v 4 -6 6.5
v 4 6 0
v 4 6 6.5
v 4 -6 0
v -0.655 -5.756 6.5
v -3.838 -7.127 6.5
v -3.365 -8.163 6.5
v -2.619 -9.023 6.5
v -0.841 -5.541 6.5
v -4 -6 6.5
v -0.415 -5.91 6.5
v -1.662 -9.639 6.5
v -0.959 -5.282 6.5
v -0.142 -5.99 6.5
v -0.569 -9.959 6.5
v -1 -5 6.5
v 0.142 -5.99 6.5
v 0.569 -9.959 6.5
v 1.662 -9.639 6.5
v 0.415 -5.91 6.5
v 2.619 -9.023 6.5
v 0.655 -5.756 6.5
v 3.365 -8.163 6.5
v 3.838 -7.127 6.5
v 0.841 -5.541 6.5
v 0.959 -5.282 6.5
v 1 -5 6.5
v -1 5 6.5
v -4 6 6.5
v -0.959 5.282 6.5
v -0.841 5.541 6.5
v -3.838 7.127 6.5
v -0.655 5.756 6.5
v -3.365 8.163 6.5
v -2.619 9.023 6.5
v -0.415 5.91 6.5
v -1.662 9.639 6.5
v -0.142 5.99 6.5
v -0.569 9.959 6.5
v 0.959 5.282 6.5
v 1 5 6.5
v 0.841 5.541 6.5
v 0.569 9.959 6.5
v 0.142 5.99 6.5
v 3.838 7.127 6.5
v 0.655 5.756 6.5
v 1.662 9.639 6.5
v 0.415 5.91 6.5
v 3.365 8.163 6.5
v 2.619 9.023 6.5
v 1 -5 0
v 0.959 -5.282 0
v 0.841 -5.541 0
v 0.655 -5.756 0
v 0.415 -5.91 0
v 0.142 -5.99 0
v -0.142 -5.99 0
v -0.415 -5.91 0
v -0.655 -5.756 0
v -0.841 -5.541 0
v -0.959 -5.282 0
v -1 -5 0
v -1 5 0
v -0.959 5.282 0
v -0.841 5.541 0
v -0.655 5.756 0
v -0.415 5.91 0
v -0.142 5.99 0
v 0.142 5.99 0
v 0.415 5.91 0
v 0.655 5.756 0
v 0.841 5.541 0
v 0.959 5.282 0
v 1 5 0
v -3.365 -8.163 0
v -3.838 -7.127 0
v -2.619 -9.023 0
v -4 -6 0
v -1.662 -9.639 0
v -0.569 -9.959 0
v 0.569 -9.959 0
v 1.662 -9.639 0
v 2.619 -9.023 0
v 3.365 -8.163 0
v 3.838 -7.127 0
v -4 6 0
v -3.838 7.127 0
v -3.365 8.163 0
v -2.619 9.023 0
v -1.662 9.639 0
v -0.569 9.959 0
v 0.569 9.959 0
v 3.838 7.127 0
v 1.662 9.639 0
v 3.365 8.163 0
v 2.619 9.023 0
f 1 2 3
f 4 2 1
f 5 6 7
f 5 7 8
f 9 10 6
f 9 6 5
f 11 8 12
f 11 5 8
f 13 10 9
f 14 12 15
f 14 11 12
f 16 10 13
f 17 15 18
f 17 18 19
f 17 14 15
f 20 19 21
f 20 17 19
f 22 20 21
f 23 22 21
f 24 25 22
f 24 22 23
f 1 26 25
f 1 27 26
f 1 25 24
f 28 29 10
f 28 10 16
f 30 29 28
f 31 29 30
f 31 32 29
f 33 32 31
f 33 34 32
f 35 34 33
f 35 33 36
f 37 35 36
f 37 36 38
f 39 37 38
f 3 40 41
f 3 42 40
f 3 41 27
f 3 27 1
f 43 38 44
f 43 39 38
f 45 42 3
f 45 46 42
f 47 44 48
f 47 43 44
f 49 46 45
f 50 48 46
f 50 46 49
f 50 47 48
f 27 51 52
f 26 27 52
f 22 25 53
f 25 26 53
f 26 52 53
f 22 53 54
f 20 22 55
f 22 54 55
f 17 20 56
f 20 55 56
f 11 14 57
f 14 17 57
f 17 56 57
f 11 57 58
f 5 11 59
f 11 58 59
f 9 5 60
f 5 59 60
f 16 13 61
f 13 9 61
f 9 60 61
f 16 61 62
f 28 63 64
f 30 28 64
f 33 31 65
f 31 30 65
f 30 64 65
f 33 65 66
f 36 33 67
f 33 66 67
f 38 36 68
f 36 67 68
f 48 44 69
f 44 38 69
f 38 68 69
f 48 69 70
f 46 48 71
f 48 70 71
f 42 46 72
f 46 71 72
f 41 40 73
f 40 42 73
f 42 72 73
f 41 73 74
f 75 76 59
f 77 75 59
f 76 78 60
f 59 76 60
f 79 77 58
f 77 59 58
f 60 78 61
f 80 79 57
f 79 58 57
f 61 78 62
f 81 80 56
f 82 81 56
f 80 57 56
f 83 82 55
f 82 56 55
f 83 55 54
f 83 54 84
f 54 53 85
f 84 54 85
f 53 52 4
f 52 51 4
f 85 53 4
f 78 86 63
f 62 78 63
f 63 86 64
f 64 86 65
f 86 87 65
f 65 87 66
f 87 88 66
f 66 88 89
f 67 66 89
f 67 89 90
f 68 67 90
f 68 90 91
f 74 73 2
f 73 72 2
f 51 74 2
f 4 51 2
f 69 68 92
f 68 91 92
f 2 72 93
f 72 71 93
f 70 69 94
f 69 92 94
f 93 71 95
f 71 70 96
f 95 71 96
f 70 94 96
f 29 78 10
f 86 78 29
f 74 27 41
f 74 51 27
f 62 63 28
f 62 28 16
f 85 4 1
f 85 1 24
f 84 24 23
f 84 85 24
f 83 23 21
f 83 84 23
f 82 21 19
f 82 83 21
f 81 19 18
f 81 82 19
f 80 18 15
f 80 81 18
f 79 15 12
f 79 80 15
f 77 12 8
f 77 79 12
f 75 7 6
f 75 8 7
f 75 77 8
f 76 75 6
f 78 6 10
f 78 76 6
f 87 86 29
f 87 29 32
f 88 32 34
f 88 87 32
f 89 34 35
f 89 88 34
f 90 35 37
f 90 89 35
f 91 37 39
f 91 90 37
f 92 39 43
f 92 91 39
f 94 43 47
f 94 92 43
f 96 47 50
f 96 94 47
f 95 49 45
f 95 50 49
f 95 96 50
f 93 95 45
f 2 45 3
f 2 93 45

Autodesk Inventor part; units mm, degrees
ref_plane "YZ Plane" through (0, 0, 0) normal (1, 0, 0) x (0, 1, 0)
ref_plane "XZ Plane" through (0, 0, 0) normal (0, 1, 0) x (-1, 0, 0)
ref_plane "XY Plane" through (0, 0, 0) normal (0, 0, 1) x (1, 0, 0)
sketch "Sketch1" plane through (0, 0, 0) normal (0, 0, 1) x (1, 0, 0)
  line L0 (0, -5) -> (0, 5) construction
  line L1 (1, -5) -> (1, 5)
  line L2 (-1, 5) -> (-1, -5)
  arc A0 (-1, -5) -> (1, -5) centre (0, -5) ccw
  arc A1 (1, 5) -> (-1, 5) centre (0, 5) ccw
  line L3 (0, -6) -> (0, 6) construction
  line L4 (-4, -6) -> (-4, 6)
  line L5 (4, 6) -> (4, -6)
  arc A2 (-4, -6) -> (4, -6) centre (0, -6) ccw
  arc A3 (4, 6) -> (-4, 6) centre (0, 6) ccw
  point P0 (0, 0)
  dimension "d0" = 5
  dimension "d1" = 2
  dimension "d2" = 1
  dimension "d3" = 3
extrude "Extrusion1" add sketch "Sketch1" along normal blind 6.5
properties part number "COILS" material "Copper"
